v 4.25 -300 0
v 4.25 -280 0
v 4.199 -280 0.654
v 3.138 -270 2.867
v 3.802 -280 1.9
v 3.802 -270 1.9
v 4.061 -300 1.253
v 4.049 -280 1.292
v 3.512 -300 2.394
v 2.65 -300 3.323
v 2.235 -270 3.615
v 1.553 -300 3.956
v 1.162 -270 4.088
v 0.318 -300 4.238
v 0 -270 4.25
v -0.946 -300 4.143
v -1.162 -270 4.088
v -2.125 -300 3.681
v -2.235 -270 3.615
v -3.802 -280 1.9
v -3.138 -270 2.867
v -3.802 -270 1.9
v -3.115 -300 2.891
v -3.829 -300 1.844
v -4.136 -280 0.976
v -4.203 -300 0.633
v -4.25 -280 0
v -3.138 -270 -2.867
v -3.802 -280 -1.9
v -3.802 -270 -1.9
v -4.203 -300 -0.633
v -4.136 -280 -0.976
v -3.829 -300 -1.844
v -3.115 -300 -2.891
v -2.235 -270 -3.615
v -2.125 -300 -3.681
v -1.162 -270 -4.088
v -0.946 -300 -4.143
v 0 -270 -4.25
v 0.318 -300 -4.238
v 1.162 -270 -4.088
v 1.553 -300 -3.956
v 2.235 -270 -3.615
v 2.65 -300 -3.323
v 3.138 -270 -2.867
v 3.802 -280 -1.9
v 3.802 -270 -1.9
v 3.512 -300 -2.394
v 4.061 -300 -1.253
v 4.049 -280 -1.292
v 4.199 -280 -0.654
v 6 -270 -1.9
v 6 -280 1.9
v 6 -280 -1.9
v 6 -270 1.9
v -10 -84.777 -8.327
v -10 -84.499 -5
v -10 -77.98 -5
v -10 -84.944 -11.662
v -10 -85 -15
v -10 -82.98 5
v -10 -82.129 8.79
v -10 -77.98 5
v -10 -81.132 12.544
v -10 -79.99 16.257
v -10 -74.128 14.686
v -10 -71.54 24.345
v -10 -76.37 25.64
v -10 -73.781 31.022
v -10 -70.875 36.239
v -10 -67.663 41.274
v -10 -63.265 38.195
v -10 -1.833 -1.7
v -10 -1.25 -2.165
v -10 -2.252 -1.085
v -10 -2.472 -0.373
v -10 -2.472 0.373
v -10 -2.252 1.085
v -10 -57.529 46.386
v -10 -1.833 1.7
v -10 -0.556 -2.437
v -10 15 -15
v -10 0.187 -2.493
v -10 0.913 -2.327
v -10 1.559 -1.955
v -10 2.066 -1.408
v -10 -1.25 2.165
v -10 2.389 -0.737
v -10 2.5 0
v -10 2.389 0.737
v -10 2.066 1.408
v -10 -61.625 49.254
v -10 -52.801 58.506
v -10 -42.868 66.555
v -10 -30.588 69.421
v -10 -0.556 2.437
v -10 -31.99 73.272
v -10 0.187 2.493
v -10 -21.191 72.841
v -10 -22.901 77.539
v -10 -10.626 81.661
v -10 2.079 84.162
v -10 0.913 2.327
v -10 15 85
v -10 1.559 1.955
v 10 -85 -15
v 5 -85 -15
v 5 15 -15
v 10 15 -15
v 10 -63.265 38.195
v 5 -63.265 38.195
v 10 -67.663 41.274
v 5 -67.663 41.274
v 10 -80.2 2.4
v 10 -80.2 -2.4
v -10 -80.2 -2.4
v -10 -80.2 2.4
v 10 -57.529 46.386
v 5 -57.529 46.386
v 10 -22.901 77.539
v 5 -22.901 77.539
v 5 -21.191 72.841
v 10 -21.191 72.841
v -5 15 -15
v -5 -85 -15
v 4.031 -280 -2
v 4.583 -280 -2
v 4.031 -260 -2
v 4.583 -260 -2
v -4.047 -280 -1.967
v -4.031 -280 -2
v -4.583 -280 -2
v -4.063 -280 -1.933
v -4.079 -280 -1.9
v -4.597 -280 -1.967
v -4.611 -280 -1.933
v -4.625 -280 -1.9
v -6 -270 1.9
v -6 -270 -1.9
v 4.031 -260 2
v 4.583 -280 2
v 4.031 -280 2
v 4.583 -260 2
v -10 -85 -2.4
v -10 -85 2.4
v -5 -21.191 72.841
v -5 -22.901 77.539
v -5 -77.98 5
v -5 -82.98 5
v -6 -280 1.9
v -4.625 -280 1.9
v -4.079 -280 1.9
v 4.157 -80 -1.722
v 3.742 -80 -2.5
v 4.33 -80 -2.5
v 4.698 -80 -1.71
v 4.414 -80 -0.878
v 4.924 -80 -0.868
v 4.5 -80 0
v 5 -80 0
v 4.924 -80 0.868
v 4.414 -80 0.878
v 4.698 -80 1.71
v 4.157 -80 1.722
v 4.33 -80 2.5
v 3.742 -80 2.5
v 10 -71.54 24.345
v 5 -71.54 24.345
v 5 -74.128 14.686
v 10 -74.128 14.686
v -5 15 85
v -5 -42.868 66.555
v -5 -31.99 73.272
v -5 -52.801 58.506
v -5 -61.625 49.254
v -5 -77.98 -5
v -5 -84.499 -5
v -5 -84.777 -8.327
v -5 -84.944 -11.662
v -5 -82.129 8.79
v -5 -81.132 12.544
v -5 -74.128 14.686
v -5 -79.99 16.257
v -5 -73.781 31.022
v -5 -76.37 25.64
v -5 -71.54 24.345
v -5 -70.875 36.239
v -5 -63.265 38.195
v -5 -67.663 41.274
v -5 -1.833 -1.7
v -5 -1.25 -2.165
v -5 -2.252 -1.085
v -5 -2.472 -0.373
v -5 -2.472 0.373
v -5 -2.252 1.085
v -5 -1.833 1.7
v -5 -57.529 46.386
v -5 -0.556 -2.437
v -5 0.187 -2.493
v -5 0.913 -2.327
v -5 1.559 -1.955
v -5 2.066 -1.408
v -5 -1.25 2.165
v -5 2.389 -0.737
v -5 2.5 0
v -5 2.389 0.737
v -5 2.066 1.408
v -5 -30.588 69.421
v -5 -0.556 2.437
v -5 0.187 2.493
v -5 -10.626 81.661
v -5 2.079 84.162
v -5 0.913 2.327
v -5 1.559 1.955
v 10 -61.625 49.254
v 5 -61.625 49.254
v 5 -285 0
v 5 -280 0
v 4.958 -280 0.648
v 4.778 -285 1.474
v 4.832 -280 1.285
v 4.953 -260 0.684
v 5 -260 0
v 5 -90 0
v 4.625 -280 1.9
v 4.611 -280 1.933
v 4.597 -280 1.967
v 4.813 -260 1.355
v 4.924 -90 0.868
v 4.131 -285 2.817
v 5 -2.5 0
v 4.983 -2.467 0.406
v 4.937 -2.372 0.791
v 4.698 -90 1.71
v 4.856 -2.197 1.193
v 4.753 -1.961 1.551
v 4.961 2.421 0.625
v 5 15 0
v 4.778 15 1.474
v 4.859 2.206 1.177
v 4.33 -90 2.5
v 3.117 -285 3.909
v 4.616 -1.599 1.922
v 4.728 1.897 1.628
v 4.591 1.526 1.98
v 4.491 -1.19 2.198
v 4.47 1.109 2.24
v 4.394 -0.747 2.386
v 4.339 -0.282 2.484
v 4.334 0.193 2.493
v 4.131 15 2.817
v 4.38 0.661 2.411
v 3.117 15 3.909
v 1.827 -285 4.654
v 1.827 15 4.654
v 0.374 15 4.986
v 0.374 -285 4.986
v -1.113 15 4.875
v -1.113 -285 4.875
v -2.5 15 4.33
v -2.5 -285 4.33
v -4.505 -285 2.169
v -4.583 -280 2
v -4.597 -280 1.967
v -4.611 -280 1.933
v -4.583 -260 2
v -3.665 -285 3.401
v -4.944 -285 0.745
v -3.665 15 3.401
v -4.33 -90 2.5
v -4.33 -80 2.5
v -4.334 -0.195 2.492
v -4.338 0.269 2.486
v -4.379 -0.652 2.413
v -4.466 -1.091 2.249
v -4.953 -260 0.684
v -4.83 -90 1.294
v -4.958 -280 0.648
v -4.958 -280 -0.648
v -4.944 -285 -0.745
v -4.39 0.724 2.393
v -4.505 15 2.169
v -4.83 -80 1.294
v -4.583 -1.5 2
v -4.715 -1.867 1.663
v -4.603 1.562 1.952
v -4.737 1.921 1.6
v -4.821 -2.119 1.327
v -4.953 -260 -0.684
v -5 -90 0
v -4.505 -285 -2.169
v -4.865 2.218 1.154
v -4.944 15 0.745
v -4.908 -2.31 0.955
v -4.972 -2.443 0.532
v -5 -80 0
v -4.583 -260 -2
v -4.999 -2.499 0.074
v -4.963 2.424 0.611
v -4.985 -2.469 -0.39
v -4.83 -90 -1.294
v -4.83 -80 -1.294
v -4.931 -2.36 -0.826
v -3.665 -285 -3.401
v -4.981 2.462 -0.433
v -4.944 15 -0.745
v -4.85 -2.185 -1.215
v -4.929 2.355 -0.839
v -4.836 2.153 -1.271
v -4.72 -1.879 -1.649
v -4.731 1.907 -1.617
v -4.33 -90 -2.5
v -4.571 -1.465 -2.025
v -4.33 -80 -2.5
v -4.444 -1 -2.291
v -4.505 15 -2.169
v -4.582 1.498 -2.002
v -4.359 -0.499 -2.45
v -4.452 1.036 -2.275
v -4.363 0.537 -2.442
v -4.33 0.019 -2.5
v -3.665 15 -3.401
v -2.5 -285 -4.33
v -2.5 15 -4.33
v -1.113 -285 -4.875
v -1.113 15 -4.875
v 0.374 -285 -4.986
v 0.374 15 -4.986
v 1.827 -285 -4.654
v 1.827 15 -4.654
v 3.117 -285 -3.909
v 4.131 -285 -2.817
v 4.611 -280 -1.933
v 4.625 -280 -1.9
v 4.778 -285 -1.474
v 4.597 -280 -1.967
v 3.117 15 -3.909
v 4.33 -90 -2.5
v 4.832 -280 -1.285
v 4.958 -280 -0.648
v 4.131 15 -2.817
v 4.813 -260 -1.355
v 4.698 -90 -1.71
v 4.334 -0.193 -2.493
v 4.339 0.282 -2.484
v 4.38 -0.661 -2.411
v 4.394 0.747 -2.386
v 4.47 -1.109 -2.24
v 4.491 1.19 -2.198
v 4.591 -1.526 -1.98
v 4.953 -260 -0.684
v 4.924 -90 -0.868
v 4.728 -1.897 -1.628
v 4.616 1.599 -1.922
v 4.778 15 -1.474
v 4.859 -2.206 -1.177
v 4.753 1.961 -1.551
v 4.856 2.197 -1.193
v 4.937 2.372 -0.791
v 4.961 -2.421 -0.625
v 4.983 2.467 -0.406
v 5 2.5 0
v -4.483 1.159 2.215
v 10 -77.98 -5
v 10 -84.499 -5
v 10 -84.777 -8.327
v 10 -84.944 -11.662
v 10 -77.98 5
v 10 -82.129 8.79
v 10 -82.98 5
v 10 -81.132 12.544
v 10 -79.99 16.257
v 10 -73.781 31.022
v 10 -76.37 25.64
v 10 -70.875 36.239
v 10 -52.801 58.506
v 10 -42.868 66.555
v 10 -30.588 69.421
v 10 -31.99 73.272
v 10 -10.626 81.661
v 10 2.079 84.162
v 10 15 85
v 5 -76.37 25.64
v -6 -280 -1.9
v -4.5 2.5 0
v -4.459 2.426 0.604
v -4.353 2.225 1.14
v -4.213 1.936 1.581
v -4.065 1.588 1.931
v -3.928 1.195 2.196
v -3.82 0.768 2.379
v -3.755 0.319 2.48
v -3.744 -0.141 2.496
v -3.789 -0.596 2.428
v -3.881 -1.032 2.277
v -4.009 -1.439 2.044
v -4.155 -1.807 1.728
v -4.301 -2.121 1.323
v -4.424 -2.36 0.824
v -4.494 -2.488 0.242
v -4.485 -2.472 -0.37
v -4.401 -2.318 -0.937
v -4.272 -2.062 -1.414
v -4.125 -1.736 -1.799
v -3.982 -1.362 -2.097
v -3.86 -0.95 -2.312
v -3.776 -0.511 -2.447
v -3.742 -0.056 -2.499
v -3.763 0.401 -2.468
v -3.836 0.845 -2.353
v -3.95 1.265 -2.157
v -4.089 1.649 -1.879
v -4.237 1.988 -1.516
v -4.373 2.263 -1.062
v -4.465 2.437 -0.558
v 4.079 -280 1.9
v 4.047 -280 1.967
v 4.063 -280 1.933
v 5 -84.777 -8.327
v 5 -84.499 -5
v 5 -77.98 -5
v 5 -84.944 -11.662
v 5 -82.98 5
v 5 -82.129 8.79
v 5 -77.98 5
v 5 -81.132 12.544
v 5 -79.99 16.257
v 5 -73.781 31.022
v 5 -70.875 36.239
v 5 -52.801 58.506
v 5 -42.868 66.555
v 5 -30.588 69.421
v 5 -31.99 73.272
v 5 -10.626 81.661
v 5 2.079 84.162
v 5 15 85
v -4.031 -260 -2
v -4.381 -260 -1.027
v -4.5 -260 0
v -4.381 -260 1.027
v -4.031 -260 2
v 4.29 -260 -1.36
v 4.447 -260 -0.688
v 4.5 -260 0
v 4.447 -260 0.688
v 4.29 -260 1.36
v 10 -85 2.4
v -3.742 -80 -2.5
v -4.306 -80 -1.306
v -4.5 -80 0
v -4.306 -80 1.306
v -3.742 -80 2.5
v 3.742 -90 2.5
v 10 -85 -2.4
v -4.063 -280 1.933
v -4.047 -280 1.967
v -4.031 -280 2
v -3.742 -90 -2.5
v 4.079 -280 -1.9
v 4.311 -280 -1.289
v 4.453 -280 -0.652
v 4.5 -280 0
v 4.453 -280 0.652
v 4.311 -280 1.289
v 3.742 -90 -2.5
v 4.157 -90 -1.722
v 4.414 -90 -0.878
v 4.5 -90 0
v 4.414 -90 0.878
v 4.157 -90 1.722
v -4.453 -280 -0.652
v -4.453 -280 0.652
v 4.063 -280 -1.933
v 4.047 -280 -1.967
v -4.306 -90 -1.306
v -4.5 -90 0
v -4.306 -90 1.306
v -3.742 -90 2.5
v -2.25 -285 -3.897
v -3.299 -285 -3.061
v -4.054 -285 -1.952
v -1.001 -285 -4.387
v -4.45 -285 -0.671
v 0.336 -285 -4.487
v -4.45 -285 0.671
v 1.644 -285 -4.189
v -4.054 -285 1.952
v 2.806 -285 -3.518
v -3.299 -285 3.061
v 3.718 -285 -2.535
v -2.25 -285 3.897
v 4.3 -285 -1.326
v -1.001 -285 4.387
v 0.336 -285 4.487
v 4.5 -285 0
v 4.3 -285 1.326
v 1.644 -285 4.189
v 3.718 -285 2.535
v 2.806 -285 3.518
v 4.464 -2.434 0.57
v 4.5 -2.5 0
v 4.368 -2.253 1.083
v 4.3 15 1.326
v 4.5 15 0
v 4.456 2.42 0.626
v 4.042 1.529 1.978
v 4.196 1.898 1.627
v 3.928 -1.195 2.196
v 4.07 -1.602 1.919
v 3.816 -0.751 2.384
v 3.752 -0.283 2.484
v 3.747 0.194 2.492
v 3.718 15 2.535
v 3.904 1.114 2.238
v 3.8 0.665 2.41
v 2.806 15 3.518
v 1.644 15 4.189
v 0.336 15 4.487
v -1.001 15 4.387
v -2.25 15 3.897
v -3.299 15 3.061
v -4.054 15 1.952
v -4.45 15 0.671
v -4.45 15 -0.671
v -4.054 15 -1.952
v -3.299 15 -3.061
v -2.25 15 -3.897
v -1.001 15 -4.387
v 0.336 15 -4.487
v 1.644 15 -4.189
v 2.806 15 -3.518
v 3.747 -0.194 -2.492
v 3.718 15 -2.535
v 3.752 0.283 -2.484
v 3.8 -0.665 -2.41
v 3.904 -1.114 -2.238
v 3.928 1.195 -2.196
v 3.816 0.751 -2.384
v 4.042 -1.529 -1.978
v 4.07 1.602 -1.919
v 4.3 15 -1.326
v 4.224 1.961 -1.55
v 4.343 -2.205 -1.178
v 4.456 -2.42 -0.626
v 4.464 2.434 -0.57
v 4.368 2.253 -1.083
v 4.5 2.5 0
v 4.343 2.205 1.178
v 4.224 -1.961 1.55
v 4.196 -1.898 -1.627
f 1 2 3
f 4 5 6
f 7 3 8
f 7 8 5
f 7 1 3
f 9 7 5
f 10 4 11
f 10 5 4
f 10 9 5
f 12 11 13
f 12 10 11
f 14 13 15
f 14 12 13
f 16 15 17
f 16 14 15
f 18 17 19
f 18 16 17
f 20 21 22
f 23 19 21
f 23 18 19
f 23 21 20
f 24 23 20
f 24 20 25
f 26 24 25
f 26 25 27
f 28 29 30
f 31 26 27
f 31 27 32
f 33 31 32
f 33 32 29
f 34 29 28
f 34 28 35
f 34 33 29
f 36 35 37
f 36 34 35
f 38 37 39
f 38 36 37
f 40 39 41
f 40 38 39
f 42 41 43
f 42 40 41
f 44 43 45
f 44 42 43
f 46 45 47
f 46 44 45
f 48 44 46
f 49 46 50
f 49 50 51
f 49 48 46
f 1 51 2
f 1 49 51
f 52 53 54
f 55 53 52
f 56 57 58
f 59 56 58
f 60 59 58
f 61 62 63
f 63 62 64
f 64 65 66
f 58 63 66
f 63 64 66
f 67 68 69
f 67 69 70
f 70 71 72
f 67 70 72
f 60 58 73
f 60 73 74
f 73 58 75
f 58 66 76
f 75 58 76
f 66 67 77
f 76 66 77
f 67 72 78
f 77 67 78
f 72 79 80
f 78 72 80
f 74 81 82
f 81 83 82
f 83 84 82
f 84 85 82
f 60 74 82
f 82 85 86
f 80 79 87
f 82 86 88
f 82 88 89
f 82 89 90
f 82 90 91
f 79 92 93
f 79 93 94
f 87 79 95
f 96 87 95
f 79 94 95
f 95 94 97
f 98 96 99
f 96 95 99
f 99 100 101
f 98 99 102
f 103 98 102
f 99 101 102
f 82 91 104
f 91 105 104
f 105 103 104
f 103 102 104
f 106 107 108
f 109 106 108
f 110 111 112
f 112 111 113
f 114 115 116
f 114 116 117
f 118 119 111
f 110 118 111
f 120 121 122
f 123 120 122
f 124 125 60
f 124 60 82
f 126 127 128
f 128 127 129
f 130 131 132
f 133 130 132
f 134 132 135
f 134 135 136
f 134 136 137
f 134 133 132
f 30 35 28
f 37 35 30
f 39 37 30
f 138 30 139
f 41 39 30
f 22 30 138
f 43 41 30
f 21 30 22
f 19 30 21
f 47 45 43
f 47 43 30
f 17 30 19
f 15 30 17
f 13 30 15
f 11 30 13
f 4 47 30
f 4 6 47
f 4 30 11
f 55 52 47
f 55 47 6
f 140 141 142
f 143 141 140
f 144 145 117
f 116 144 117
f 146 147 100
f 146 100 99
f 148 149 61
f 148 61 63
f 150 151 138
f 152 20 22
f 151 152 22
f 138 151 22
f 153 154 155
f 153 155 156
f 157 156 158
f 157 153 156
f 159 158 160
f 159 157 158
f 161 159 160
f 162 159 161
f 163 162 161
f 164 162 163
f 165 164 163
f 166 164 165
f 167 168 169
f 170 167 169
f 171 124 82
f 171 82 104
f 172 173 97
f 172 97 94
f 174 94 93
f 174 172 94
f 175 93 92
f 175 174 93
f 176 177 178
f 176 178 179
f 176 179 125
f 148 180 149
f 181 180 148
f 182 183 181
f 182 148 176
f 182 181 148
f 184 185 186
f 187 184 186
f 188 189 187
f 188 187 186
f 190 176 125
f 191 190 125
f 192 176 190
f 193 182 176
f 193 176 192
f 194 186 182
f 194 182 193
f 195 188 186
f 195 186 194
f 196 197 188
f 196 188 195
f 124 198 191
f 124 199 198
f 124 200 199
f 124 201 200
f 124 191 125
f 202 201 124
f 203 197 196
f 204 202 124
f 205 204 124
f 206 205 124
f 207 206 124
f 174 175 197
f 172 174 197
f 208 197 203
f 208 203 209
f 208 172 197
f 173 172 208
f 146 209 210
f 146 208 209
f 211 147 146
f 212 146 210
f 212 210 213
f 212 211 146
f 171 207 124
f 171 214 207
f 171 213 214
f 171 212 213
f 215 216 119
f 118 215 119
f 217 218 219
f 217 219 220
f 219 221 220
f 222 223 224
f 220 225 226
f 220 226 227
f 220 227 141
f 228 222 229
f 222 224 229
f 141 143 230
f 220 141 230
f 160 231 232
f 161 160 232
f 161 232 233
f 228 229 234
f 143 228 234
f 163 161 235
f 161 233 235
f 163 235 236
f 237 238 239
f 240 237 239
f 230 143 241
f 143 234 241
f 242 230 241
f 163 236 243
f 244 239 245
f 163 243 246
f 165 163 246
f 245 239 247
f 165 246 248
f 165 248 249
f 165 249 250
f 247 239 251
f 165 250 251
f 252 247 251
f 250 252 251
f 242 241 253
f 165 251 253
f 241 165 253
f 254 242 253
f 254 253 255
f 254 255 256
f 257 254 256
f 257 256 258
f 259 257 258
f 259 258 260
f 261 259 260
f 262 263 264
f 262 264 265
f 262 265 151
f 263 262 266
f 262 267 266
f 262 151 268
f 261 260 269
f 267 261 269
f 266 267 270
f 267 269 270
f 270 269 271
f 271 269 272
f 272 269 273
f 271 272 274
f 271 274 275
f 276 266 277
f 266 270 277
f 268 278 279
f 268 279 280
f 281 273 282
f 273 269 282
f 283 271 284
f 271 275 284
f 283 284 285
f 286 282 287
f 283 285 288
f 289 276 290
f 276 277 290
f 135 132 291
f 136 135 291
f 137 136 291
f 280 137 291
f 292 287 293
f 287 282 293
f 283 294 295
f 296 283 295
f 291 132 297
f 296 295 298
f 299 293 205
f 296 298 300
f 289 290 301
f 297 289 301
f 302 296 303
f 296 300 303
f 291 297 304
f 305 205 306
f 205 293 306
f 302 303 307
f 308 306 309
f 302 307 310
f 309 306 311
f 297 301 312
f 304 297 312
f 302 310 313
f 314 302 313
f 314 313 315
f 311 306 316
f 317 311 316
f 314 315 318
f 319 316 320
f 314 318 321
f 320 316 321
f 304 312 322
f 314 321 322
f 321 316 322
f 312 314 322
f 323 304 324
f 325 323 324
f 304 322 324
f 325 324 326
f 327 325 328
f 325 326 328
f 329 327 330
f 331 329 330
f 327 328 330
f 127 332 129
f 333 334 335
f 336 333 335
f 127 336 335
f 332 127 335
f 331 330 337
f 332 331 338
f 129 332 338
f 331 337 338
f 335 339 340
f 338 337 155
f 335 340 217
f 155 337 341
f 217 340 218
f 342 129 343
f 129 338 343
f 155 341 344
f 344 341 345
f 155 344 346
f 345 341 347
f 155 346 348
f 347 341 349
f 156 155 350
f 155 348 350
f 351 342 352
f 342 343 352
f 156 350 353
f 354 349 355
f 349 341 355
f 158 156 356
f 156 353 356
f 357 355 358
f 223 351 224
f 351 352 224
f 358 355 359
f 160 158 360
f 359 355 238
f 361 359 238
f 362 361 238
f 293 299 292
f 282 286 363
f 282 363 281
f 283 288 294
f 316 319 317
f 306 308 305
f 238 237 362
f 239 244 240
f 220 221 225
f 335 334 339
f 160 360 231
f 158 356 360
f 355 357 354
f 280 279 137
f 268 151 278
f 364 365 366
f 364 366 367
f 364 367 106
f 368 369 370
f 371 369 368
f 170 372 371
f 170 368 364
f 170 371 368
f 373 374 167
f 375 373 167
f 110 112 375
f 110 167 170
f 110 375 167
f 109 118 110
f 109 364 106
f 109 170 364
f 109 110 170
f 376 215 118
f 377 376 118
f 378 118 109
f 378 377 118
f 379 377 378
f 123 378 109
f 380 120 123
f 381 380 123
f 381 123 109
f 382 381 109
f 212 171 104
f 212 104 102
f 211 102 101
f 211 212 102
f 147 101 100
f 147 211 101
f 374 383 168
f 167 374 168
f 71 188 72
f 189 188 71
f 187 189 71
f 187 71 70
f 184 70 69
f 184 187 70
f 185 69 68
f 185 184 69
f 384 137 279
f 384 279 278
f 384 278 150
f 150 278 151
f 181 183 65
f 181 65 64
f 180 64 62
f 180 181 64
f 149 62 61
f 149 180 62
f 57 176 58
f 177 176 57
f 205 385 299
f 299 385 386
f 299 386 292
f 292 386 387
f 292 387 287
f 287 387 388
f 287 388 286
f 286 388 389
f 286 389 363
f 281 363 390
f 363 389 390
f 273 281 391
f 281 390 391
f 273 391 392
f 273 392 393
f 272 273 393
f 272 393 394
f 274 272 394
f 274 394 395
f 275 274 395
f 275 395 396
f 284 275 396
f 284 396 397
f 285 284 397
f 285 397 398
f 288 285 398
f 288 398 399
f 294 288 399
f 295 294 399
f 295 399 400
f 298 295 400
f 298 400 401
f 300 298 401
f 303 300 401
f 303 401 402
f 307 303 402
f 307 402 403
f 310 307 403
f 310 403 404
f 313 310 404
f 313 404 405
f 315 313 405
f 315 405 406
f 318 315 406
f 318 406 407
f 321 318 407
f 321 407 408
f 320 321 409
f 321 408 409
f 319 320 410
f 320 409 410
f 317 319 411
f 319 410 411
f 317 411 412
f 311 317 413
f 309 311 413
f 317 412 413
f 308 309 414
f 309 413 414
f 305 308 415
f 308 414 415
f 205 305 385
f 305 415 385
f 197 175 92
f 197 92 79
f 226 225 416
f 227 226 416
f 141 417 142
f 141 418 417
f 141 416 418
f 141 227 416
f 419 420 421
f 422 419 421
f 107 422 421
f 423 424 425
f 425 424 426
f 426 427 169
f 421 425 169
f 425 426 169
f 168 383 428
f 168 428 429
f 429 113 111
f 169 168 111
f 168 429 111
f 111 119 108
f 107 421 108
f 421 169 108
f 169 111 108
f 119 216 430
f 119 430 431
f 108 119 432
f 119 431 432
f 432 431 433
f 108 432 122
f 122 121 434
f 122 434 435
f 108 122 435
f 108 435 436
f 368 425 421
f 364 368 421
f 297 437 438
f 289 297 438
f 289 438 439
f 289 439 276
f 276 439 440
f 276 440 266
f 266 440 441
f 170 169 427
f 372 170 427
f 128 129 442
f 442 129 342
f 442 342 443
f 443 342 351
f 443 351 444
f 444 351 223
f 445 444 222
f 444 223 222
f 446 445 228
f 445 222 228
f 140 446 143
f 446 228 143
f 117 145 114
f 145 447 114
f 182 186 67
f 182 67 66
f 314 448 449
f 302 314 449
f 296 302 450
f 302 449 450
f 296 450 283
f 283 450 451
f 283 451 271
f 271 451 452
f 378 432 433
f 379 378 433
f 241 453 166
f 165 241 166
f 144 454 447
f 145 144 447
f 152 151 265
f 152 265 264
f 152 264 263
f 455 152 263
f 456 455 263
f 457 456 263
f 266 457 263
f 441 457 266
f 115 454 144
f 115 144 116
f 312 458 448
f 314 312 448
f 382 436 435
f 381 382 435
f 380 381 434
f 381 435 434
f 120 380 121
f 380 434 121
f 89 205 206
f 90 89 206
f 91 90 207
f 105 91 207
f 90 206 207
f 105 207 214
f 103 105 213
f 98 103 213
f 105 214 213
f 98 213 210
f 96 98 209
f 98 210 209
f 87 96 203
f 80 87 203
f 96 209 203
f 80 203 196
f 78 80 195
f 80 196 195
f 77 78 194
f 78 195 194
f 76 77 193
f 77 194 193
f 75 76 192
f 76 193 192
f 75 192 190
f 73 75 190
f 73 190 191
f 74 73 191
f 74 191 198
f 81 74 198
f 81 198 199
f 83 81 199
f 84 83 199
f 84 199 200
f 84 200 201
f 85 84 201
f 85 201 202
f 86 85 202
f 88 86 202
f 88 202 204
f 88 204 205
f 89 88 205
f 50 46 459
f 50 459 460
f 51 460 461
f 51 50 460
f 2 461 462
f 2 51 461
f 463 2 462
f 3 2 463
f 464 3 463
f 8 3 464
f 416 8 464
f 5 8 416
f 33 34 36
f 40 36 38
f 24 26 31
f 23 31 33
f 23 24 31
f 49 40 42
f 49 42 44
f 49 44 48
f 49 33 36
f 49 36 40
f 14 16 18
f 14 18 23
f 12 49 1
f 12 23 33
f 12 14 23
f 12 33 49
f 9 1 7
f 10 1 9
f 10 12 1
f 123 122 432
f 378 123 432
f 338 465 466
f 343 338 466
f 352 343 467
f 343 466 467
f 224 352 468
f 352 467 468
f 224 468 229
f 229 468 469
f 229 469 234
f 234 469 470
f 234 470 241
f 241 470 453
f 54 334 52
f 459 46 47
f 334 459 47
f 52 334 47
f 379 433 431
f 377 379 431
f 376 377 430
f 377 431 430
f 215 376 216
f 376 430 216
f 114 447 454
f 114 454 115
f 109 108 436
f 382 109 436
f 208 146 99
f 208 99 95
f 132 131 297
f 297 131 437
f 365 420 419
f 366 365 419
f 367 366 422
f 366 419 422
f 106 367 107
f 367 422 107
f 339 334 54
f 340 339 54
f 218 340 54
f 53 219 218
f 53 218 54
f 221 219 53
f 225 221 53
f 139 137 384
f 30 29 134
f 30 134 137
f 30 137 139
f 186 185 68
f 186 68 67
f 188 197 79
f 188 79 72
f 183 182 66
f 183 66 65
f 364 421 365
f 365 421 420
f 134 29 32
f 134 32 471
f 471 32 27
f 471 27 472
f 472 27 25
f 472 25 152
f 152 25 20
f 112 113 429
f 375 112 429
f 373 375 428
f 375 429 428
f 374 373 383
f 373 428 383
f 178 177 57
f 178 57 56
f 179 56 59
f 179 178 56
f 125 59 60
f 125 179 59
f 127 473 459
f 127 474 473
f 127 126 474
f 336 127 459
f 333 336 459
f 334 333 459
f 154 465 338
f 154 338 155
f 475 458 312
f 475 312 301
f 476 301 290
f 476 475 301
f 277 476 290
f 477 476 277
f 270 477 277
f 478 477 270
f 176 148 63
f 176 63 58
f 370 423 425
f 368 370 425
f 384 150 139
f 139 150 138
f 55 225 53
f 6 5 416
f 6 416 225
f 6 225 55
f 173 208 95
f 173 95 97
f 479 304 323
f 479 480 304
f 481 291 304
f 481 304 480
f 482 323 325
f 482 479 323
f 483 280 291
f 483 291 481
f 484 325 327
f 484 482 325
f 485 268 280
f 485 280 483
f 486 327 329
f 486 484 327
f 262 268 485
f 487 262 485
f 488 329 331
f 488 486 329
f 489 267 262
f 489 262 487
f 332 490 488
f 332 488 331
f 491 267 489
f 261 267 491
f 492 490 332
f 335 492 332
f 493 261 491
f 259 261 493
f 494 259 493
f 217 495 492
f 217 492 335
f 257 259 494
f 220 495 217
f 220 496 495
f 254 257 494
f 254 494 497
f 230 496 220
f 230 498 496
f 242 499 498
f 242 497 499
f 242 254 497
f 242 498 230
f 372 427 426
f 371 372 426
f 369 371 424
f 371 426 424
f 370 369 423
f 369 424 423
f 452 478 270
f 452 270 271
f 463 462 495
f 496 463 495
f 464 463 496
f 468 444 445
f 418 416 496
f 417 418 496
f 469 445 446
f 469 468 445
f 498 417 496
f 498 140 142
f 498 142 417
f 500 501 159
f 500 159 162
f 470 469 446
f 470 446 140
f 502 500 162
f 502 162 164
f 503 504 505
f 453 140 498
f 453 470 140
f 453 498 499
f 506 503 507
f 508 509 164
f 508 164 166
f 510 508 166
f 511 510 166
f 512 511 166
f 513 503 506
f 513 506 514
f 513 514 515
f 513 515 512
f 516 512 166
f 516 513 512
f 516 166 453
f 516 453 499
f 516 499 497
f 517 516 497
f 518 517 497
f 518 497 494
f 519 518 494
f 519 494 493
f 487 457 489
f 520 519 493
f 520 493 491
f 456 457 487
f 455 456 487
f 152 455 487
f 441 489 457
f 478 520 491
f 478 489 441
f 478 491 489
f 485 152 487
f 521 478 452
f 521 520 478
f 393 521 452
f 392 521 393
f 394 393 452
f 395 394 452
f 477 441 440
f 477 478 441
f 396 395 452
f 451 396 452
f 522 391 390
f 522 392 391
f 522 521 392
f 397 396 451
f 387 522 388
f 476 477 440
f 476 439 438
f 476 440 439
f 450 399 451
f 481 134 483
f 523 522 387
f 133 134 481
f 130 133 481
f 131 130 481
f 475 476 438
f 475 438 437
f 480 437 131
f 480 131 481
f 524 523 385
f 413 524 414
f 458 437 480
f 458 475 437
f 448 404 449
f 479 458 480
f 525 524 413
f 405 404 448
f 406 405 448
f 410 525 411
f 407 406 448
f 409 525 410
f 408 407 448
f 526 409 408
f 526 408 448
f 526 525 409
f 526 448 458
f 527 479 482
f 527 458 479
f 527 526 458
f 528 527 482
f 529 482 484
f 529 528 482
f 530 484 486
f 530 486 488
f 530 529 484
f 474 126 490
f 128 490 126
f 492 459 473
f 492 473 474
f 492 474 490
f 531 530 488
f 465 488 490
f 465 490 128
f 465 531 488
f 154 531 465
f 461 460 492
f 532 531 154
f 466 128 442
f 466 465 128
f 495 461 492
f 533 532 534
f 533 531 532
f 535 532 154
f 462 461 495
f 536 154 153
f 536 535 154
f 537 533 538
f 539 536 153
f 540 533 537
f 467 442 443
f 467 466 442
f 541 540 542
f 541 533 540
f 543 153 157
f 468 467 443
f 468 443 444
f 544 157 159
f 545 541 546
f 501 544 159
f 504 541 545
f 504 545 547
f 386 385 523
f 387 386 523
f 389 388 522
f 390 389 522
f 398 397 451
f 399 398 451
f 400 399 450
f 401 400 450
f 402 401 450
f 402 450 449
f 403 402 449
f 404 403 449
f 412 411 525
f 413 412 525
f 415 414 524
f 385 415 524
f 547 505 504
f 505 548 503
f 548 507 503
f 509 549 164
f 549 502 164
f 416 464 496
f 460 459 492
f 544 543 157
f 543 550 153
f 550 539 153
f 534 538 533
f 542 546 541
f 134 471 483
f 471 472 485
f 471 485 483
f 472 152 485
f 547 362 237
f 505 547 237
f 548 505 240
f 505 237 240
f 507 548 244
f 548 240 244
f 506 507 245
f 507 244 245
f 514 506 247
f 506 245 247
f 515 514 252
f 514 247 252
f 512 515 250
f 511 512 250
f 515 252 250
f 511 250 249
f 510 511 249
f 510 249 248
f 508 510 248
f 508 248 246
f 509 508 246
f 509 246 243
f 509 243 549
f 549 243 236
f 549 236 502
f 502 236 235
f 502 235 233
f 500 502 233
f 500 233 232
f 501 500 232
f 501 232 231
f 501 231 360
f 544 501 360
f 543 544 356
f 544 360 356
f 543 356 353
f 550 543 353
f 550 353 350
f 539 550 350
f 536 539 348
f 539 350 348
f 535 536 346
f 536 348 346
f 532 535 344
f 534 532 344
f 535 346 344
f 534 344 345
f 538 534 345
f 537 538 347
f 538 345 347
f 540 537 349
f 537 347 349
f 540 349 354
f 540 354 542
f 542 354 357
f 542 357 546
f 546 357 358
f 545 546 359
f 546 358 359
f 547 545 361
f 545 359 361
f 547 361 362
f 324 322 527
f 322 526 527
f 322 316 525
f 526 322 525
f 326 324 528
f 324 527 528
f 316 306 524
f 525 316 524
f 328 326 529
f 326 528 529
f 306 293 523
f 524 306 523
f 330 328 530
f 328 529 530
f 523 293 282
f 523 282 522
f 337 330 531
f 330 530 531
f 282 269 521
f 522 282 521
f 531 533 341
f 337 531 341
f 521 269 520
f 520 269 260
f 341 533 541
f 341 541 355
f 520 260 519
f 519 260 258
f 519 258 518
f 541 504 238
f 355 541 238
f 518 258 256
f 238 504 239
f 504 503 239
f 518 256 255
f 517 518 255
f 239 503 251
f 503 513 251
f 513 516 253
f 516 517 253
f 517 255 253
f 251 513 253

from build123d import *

# Parameters (mm, degrees)
F2_DEPTH       = 5
F5_R           = 5
F5_R_2         = 4.5
F6_DEPTH       = 300
F7_W           = 20
F7_H           = 4
F8_DEPTH       = 25
F9_R           = 4.25
F10_DEPTH      = 15
F10_DEPTH_BACK = 15
F11_W          = 10
F11_H          = 3.8
F12_DEPTH      = 6
F12_DEPTH_BACK = 6
F13_W          = 10
F13_H          = 5
F14_DEPTH      = 25
F14_DEPTH_BACK = 25
F15_W          = 4.8
F15_H          = 4.8
F16_DEPTH      = 10
F16_DEPTH_BACK = 10
F17_D          = 5
F17_DEPTH      = 15.001
F17_2_D        = 5
F17_2_DEPTH    = 15.001


with BuildPart() as f2:
    # F1 (on offset) → F2 (new body)
    with BuildSketch(Plane.YZ.offset(5)):
        with BuildLine():
            ThreePointArc((-84.4987437107, -5), (-84.874607311, -9.993722494), (-85, -15))
            Line((-85, -15), (15, -15))
            Line((15, -15), (15, 85))
            ThreePointArc((15, 85), (-4.3142117375, 83.1170791705), (-22.9010808434, 77.5392244991))
            Line((-22.9010808434, 77.5392244991), (-21.1909801268, 72.8407613952))
            Line((-21.1909801268, 72.8407613952), (-30.5879063346, 69.420559962))
            Line((-30.5879063346, 69.420559962), (-31.9897514765, 73.2720978349))
            ThreePointArc((-31.9897514765, 73.2720978349), (-47.9632403067, 62.6893195367), (-61.625049246, 49.2541969684))
            Line((-61.625049246, 49.2541969684), (-57.5292890245, 46.3863147866))
            Line((-57.5292890245, 46.3863147866), (-63.265053388, 38.1947943437))
            Line((-63.265053388, 38.1947943437), (-67.6631433607, 41.2743700963))
            ThreePointArc((-67.6631433607, 41.2743700963), (-72.3668719499, 33.6521293028), (-76.3697118886, 25.6395835288))
            Line((-76.3697118886, 25.6395835288), (-71.5400827572, 24.3454883033))
            Line((-71.5400827572, 24.3454883033), (-74.1282732082, 14.6862300404))
            Line((-74.1282732082, 14.6862300404), (-79.9895533557, 16.2567553225))
            ThreePointArc((-79.9895533557, 16.2567553225), (-81.6485963638, 10.6719461845), (-82.9795897113, 5))
            Line((-82.9795897113, 5), (-77.9795897113, 5))
            Line((-77.9795897113, 5), (-77.9795897113, -5))
            Line((-77.9795897113, -5), (-84.4987437107, -5))
        make_face()
    extrude(amount=F2_DEPTH)


with BuildPart() as f3_1:
    # F3: instance of F2
    add(f2.part.mirror(Plane.YZ))

    # F17 (through all, one way)
    with BuildSketch(Plane.YZ.offset(5)):
        with Locations((0, 0)):
            Circle(F17_D / 2)
    extrude(amount=-F17_DEPTH, mode=Mode.SUBTRACT)


with BuildPart() as f6:
    # F5 (on offset) → F6 (new body)
    with BuildSketch(Plane.XZ.offset(-15)):
        Circle(F5_R)
        Circle(F5_R_2, mode=Mode.SUBTRACT)
    extrude(amount=F6_DEPTH)

    # F7 (on offset) → F8 (cut)
    with BuildSketch(Plane.YZ.offset(5)):
        with Locations((-270, 0)):
            Rectangle(F7_W, F7_H)
    extrude(amount=-F8_DEPTH, mode=Mode.SUBTRACT)



with BuildPart() as f10:
    # F9 (on face) → F10 (new body, two sides)
    with BuildSketch(Plane.XZ.offset(285)) as f10_sk:
        Circle(F9_R)
    extrude(amount=F10_DEPTH)
    extrude(f10_sk.sketch, amount=-F10_DEPTH_BACK)


with BuildPart() as f6_1:
    add(f6.part)

    add(f10.part)  # F12 merges F10
    # F11 (on Right) → F12 (join, two sides)
    with BuildSketch(Plane.YZ) as f12_sk:
        with Locations((-275, 0)):
            Rectangle(F11_W, F11_H)
    extrude(amount=F12_DEPTH)
    extrude(f12_sk.sketch, amount=-F12_DEPTH_BACK)

    # F13 (on Right) → F14 (cut, two sides)
    with BuildSketch(Plane.YZ) as f14_sk:
        with Locations((-85, 0)):
            Rectangle(F13_W, F13_H)
    extrude(amount=F14_DEPTH, mode=Mode.SUBTRACT)
    extrude(f14_sk.sketch, amount=-F14_DEPTH_BACK, mode=Mode.SUBTRACT)

    # F17#2 (through all, one way)
    with BuildSketch(Plane.YZ.offset(5)):
        with Locations((0, 0)):
            Circle(F17_2_D / 2)
    extrude(amount=-F17_2_DEPTH, mode=Mode.SUBTRACT)


with BuildPart() as f16:
    # F15 (on Right) → F16 (new body, two sides)
    with BuildSketch(Plane.YZ) as f16_sk:
        with Locations((-82.6, 0)):
            Rectangle(F15_W, F15_H)
    extrude(amount=F16_DEPTH)
    extrude(f16_sk.sketch, amount=-F16_DEPTH_BACK)


solid = Compound([f2.part, f3_1.part, f6_1.part, f16.part])
